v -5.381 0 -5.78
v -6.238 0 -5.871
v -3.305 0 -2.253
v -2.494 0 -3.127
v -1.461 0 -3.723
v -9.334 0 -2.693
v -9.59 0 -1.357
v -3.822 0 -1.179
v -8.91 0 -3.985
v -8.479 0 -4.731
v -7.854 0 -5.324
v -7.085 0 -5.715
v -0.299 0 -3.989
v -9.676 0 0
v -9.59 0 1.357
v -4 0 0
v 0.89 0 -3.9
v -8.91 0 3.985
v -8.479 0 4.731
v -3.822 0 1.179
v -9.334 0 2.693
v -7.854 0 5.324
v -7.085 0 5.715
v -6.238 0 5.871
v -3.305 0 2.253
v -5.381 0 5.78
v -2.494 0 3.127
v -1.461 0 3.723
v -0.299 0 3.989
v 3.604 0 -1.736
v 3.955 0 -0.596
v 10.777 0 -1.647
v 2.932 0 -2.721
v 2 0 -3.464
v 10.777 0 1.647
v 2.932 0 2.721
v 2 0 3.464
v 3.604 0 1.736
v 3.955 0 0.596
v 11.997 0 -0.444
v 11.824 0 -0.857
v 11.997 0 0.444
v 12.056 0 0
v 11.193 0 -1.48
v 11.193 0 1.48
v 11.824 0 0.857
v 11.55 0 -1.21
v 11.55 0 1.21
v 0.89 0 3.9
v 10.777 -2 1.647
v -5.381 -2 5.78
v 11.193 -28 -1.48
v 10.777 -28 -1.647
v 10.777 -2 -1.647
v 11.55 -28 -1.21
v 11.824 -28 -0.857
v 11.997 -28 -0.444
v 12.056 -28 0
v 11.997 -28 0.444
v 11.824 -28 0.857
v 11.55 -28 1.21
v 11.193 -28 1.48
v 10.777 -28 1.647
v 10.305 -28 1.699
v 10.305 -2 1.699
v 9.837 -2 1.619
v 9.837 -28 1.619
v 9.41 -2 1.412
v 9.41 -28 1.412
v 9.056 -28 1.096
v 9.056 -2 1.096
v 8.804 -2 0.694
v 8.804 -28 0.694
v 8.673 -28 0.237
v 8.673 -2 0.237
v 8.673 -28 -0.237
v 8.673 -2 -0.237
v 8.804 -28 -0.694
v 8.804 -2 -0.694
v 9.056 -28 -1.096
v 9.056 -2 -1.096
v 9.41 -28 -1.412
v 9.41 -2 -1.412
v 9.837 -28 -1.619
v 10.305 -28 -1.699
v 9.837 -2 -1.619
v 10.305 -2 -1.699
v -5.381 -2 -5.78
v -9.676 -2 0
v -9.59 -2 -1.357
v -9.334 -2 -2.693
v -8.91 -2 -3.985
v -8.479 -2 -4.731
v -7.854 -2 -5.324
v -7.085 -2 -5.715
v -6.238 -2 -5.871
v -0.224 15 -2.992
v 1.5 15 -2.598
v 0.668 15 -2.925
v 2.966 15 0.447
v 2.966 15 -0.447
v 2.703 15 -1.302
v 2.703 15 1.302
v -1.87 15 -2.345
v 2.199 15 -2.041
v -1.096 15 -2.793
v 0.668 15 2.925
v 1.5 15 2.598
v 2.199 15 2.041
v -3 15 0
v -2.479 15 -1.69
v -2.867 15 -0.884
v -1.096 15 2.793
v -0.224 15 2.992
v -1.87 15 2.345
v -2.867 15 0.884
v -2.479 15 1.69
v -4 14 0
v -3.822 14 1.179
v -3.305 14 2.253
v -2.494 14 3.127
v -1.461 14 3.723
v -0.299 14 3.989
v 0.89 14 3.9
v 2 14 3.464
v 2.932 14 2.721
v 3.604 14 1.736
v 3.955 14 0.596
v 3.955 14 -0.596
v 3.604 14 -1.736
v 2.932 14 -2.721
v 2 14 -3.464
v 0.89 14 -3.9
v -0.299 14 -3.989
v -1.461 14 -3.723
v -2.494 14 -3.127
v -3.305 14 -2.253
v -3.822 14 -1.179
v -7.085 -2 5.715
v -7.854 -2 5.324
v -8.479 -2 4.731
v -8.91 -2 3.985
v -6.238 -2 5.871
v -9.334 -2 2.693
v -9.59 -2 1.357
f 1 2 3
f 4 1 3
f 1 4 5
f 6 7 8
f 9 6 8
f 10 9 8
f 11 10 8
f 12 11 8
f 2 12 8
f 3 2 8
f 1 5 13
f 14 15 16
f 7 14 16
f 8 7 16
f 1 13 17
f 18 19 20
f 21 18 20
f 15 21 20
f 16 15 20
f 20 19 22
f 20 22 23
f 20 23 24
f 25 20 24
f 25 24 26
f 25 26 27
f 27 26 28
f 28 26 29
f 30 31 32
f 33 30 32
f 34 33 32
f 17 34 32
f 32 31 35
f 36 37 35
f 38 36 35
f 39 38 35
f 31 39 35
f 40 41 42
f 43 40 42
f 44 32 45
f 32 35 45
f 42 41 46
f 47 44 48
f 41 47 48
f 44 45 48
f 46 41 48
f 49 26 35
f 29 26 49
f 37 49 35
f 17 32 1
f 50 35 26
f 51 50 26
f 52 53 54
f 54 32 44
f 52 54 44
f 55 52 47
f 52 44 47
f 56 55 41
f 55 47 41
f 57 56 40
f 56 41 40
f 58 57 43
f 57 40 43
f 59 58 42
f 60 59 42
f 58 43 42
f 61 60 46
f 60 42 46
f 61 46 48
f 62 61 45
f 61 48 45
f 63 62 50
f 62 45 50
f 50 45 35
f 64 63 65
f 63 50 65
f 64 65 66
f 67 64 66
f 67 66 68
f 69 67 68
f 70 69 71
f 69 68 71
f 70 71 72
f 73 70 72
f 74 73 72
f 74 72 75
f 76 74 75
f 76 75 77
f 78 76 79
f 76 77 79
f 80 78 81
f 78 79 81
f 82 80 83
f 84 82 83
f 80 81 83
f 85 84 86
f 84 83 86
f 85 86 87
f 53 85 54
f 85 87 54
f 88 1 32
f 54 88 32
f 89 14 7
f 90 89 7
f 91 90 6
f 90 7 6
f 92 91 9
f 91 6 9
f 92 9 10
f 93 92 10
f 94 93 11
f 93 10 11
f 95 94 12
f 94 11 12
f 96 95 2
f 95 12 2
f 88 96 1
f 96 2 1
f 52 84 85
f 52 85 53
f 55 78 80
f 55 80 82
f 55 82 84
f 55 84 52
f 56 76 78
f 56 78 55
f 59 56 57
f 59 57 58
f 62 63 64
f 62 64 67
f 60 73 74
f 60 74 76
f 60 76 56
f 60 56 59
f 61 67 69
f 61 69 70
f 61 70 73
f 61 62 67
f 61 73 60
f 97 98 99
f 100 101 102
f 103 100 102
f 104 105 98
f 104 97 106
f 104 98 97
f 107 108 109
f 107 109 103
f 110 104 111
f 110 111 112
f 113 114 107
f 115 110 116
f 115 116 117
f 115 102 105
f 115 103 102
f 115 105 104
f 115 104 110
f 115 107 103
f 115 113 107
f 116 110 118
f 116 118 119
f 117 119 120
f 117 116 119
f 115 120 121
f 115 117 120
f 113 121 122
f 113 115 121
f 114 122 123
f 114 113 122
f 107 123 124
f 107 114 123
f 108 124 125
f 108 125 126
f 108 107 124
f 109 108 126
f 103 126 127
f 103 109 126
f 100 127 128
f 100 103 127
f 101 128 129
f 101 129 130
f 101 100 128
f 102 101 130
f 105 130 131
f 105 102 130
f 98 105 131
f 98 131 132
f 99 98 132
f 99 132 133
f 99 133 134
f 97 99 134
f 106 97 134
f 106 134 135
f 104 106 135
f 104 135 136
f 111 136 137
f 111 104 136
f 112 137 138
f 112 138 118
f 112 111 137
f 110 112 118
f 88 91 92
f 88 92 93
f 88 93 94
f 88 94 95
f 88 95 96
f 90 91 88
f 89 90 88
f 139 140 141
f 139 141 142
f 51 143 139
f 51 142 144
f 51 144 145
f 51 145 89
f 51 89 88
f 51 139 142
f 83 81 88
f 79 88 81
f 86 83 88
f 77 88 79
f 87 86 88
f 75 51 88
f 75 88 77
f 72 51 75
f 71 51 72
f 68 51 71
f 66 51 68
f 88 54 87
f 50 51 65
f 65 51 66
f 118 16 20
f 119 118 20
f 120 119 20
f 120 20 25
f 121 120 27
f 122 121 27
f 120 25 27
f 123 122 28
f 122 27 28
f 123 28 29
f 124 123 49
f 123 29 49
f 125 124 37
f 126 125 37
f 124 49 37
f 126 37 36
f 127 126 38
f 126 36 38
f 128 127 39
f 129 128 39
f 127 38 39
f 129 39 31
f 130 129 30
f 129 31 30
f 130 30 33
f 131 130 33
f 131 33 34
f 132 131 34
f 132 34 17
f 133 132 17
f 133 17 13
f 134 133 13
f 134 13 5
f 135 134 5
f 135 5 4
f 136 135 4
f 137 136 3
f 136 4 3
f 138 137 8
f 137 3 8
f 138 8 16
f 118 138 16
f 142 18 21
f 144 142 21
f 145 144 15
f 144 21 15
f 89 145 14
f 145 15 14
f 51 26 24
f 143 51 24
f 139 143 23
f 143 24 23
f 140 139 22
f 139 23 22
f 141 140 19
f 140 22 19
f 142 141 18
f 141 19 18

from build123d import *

# Parameters (mm, degrees)
F1_DEPTH = 2
F3_DEPTH = 26
F4_R     = 4
F5_DEPTH = 15
F6_SIZE  = 1


with BuildPart() as f1:
    # F0 (on Front) → F1 (new body)
    with BuildSketch(Plane.XZ):
        with BuildLine():
            ThreePointArc((10.7772780728, -1.6469869803), (11.6988240407, -1.0425715004), (12.0560490534, 0))
            ThreePointArc((12.0560490534, 0), (11.6988240407, 1.0425715004), (10.7772780728, 1.6469869803))
            Line((10.7772780728, 1.6469869803), (-5.3807416604, 5.7795192287))
            ThreePointArc((-5.3807416604, 5.7795192287), (-7.4835794739, 5.5473528625), (-8.9103223258, 3.9852283712))
            ThreePointArc((-8.9103223258, 3.9852283712), (-9.4830781383, 2.0290875977), (-9.6763123684, 0))
            ThreePointArc((-9.6763123684, 0), (-9.4830781383, -2.0290875977), (-8.9103223258, -3.9852283712))
            ThreePointArc((-8.9103223258, -3.9852283712), (-7.4835794739, -5.5473528625), (-5.3807416604, -5.7795192287))
            Line((-5.3807416604, -5.7795192287), (10.7772780728, -1.6469869803))
        make_face()
    extrude(amount=F1_DEPTH)

    # F2 (on face) → F3 (join)
    with BuildSketch(Plane.XZ.offset(2)):
        with BuildLine():
            ThreePointArc((10.7772780728, -1.6469869803), (11.6988240407, -1.0425715004), (12.0560490534, 0))
            ThreePointArc((12.0560490534, 0), (11.6988240407, 1.0425715004), (10.7772780728, 1.6469869803))
            ThreePointArc((10.7772780728, 1.6469869803), (8.6560490534, 0), (10.7772780728, -1.6469869803))
        make_face()
    extrude(amount=F3_DEPTH)

    # F4 (on face) → F5 (join)
    with BuildSketch(Plane(origin=(0, 0, 0), x_dir=(-1, 0, 0), z_dir=(0, 1, 0))):
        Circle(F4_R)
    extrude(amount=F5_DEPTH)

    # F6
    f6_edges = [f1.edges().sort_by_distance(p)[0] for p in [
        (4, 15, 0),
    ]]
    chamfer(f6_edges, length=F6_SIZE)


solid = f1.part
